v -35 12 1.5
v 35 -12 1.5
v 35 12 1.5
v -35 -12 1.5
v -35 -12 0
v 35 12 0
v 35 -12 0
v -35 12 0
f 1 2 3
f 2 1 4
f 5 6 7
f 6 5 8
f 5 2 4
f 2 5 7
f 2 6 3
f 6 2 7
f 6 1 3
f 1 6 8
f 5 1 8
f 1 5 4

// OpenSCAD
$fn = 64;

// Dimensions in millimeters
spine_length = 70.0;      // Length of the spine (X direction)
spine_width = 12.0;      // Width of the spine (Y direction)
tooth_width = 5.0;         // Width of each tooth (X direction)
tooth_length = 12.0;       // Length of each tooth (Y direction, extending in -Y)
gap = 1.5;               // Gap between adjacent teeth (X direction)
thickness = 1.5;           // Thickness of the comb (Z direction)

// Total Y dimension: spine_width (Y positive) + tooth_length (Y negative)
total_Y = spine_width + tooth_length;

// Center the comb at the origin in X and Y
translate([ -spine_length/2, -total_Y/2, 0 ])
    cube([spine_length, total_Y, thickness]);
